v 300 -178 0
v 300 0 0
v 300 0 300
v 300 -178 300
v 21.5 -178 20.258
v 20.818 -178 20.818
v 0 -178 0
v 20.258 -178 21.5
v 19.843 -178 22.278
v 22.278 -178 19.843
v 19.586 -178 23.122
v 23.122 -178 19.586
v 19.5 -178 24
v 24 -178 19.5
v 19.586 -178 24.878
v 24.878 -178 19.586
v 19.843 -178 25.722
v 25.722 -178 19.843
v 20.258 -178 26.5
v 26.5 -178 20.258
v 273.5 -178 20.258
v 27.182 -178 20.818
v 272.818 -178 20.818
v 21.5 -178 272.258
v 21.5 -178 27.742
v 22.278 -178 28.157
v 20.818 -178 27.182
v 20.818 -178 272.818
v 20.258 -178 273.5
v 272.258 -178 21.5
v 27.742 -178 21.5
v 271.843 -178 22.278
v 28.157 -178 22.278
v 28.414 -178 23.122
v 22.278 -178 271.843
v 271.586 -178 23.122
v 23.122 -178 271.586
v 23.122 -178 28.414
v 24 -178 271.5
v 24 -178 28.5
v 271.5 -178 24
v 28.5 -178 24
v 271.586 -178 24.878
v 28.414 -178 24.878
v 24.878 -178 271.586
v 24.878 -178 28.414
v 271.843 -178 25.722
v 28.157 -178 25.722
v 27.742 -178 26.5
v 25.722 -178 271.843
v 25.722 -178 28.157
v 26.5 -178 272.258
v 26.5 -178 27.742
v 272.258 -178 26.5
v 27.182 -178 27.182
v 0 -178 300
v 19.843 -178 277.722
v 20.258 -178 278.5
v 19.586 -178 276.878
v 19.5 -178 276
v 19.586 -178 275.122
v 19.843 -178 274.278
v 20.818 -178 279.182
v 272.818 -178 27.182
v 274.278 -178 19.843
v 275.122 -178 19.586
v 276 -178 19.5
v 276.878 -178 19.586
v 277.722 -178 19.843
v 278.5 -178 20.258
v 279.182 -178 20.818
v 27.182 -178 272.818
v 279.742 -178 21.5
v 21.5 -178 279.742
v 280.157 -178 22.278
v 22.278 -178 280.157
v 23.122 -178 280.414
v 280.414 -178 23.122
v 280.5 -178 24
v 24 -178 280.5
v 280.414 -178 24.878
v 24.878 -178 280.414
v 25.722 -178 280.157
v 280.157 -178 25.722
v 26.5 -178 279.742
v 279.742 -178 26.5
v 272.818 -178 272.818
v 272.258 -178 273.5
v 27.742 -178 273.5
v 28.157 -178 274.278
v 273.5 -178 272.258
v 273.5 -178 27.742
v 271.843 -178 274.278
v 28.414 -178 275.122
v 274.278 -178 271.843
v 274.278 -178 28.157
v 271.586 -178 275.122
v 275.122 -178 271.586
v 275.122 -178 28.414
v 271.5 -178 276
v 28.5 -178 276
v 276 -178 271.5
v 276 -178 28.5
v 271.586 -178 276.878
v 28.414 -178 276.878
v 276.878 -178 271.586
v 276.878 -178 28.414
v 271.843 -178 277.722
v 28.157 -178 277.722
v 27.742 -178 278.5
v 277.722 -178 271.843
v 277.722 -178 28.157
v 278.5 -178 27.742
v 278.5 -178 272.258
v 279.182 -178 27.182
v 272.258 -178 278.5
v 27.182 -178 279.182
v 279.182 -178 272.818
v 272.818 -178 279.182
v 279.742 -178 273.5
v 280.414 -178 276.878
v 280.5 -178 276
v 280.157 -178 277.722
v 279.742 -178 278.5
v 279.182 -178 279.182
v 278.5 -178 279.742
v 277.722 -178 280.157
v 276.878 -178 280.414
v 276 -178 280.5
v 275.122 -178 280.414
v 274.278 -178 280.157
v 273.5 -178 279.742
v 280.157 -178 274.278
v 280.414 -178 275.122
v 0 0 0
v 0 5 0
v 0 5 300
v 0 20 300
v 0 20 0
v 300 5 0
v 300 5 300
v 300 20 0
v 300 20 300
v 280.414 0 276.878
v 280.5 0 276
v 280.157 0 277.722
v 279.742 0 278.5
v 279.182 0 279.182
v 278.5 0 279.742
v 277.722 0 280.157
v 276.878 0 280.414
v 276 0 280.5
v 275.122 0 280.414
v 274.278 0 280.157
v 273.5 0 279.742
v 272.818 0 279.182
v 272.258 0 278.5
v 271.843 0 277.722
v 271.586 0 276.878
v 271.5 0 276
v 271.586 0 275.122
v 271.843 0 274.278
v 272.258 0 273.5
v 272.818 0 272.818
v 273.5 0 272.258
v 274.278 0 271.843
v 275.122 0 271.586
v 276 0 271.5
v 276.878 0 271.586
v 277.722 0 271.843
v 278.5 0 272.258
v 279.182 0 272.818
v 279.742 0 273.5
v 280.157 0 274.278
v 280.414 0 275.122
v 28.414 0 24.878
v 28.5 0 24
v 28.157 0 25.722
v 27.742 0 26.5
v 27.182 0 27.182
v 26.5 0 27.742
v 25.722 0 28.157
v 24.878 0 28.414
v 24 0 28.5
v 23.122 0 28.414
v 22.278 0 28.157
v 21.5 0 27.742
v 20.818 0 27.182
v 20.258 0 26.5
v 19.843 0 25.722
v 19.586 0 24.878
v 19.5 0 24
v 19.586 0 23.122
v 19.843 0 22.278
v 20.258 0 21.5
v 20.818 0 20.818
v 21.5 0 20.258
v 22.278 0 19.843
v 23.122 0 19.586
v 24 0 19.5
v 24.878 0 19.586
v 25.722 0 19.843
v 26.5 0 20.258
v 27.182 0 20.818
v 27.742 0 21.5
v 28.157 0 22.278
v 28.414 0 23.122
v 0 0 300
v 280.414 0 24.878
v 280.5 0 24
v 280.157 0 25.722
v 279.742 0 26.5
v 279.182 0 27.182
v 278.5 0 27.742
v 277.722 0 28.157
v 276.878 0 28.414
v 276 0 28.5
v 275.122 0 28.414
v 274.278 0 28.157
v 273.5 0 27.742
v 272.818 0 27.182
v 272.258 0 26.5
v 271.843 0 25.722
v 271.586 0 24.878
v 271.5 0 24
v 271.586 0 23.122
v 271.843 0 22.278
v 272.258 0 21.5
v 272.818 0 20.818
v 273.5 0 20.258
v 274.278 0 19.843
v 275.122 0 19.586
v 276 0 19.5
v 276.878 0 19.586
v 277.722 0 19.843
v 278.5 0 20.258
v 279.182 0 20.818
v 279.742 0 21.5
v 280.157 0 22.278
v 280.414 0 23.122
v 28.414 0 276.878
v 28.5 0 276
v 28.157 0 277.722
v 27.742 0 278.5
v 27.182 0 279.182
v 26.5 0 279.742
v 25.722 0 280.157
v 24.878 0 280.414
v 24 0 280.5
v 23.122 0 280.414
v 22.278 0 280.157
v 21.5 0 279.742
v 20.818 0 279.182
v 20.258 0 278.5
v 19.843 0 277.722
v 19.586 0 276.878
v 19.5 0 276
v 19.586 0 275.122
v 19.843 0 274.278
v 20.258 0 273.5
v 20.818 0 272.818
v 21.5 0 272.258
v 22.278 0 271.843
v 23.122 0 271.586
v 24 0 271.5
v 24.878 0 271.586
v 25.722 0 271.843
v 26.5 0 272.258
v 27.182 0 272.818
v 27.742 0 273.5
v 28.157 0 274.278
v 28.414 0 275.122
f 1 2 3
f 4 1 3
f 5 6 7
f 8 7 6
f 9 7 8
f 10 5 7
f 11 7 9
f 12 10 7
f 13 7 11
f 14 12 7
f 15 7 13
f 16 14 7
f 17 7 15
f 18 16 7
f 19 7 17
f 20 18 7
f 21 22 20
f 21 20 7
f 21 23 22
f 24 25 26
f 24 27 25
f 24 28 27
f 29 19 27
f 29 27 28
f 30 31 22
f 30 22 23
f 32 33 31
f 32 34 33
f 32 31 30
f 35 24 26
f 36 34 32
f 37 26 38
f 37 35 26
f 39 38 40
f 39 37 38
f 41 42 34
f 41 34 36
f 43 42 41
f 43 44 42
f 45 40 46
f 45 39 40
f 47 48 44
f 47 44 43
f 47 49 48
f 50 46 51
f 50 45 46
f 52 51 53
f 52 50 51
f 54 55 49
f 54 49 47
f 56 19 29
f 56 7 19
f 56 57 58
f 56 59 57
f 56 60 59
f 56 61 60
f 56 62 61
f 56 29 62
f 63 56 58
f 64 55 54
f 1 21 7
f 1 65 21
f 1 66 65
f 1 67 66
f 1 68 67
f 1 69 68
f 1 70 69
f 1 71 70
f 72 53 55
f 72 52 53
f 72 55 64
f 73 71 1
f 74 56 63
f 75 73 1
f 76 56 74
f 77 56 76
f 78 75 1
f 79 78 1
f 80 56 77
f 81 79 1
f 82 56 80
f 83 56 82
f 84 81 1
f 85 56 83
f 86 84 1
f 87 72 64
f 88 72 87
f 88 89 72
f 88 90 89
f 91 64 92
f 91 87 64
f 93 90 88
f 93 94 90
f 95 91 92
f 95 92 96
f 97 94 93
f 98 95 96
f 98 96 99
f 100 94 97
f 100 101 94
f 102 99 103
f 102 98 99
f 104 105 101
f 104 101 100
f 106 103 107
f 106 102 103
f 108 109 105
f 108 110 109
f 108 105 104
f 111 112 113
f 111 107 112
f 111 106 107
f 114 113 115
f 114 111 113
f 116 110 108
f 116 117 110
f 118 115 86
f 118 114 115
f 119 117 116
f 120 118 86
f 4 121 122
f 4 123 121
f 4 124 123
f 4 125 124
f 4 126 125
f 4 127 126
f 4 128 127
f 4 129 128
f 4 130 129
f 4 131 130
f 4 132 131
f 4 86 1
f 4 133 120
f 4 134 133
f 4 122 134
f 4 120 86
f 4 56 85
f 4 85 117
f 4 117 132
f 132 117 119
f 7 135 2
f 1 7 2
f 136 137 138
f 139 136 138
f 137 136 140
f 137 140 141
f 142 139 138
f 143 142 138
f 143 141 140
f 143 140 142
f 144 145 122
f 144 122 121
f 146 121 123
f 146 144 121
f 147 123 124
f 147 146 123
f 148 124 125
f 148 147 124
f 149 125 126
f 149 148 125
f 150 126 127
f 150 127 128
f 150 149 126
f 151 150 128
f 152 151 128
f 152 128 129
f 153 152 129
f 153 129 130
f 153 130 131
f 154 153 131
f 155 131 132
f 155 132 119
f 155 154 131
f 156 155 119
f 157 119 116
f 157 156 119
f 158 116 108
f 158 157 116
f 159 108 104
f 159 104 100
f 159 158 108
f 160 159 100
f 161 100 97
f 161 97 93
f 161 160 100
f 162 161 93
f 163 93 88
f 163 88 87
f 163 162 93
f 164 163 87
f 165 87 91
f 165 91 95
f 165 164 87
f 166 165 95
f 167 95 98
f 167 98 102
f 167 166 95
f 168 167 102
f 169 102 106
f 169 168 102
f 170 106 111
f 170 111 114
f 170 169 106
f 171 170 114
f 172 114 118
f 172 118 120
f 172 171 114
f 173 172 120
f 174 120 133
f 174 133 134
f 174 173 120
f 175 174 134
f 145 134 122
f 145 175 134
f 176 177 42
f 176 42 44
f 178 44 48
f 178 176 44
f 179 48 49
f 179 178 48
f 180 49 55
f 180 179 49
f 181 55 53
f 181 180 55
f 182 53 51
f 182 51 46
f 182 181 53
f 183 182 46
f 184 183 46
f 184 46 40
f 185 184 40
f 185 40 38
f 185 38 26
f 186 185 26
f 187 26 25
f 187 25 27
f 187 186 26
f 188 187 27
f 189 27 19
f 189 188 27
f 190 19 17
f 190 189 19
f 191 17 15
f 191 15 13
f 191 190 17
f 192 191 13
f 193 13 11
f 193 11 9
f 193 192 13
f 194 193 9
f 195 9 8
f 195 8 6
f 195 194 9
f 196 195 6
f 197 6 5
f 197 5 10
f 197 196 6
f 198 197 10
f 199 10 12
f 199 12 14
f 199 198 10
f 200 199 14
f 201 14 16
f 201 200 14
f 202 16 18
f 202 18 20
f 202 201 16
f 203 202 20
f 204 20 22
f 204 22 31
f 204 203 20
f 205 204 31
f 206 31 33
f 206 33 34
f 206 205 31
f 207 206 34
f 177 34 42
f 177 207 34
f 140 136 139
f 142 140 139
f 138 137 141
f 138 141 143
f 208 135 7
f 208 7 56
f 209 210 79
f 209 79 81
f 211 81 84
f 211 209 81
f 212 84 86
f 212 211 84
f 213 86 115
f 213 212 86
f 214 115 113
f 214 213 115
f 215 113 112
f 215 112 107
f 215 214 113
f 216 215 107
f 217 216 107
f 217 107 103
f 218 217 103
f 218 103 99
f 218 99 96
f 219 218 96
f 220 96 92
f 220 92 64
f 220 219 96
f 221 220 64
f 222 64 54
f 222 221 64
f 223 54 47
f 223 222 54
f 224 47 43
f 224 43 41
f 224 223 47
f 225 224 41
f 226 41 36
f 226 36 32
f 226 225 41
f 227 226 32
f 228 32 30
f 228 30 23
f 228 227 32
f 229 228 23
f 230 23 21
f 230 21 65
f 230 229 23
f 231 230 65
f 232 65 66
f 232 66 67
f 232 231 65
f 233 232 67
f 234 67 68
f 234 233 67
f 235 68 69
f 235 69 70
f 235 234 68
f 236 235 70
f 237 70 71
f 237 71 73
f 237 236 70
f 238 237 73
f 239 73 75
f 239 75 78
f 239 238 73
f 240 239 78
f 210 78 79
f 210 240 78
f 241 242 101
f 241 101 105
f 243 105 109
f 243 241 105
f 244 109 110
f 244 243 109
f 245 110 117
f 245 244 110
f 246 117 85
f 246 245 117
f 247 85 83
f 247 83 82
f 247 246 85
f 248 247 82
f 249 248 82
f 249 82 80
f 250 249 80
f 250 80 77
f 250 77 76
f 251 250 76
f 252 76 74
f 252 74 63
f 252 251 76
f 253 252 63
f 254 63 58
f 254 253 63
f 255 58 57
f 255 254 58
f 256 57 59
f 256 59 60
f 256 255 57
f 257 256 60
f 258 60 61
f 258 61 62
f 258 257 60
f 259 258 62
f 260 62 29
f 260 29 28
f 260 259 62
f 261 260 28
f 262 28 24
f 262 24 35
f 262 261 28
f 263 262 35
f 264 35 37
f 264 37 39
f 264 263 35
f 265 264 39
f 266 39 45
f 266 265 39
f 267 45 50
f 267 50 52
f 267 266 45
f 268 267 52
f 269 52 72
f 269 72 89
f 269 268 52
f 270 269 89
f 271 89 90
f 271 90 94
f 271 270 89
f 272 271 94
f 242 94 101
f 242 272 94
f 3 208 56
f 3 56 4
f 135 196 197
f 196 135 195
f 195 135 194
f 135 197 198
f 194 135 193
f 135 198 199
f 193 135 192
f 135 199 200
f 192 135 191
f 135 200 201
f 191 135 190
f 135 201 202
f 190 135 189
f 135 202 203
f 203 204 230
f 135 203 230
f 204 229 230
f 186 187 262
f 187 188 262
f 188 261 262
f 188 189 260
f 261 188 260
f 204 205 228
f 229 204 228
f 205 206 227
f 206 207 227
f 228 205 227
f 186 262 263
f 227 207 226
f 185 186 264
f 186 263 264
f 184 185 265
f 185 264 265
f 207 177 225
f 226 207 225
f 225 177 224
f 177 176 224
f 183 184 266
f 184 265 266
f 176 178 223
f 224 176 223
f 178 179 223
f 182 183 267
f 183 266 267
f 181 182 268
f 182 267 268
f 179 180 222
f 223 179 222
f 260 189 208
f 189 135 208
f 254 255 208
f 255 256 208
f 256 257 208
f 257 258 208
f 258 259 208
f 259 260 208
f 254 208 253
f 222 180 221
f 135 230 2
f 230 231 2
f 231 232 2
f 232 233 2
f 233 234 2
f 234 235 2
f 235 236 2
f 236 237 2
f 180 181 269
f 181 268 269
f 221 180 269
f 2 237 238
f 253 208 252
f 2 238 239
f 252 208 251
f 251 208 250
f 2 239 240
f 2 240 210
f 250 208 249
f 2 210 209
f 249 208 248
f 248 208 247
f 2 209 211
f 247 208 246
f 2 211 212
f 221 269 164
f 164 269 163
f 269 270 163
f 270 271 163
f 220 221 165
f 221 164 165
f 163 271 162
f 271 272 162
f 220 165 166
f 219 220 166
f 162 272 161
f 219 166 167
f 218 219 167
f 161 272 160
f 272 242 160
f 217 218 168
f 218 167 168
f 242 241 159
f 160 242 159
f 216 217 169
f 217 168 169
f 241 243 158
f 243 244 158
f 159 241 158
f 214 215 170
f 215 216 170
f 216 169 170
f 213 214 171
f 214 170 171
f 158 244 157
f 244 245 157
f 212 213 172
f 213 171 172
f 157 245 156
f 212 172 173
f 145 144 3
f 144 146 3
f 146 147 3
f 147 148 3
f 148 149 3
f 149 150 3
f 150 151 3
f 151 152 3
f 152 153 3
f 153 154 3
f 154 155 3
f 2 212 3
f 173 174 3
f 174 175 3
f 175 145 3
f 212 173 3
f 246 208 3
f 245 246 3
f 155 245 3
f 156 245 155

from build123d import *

# Parameters (mm, degrees)
F0_W     = 300
F0_H     = 300
F0_R     = 4.5
F1_DEPTH = 178
F2_W     = 15
F2_H     = 300
F3_DEPTH = 300


with BuildPart() as f1:
    # F0 (on Front) → F1 (new body)
    with BuildSketch(Plane.XZ):
        with Locations((150, 150)):
            Rectangle(F0_W, F0_H)
        with Locations((24, 24)):
            Circle(F0_R, mode=Mode.SUBTRACT)
        with Locations((276, 24)):
            Circle(F0_R, mode=Mode.SUBTRACT)
        with Locations((24, 276)):
            Circle(F0_R, mode=Mode.SUBTRACT)
        with Locations((276, 276)):
            Circle(F0_R, mode=Mode.SUBTRACT)
    extrude(amount=F1_DEPTH)


with BuildPart() as f3:
    # F2 (on Right) → F3 (new body)
    with BuildSketch(Plane.YZ):
        with Locations((12.5, 150)):
            Rectangle(F2_W, F2_H)
    extrude(amount=F3_DEPTH)


solid = Compound([f1.part, f3.part])
